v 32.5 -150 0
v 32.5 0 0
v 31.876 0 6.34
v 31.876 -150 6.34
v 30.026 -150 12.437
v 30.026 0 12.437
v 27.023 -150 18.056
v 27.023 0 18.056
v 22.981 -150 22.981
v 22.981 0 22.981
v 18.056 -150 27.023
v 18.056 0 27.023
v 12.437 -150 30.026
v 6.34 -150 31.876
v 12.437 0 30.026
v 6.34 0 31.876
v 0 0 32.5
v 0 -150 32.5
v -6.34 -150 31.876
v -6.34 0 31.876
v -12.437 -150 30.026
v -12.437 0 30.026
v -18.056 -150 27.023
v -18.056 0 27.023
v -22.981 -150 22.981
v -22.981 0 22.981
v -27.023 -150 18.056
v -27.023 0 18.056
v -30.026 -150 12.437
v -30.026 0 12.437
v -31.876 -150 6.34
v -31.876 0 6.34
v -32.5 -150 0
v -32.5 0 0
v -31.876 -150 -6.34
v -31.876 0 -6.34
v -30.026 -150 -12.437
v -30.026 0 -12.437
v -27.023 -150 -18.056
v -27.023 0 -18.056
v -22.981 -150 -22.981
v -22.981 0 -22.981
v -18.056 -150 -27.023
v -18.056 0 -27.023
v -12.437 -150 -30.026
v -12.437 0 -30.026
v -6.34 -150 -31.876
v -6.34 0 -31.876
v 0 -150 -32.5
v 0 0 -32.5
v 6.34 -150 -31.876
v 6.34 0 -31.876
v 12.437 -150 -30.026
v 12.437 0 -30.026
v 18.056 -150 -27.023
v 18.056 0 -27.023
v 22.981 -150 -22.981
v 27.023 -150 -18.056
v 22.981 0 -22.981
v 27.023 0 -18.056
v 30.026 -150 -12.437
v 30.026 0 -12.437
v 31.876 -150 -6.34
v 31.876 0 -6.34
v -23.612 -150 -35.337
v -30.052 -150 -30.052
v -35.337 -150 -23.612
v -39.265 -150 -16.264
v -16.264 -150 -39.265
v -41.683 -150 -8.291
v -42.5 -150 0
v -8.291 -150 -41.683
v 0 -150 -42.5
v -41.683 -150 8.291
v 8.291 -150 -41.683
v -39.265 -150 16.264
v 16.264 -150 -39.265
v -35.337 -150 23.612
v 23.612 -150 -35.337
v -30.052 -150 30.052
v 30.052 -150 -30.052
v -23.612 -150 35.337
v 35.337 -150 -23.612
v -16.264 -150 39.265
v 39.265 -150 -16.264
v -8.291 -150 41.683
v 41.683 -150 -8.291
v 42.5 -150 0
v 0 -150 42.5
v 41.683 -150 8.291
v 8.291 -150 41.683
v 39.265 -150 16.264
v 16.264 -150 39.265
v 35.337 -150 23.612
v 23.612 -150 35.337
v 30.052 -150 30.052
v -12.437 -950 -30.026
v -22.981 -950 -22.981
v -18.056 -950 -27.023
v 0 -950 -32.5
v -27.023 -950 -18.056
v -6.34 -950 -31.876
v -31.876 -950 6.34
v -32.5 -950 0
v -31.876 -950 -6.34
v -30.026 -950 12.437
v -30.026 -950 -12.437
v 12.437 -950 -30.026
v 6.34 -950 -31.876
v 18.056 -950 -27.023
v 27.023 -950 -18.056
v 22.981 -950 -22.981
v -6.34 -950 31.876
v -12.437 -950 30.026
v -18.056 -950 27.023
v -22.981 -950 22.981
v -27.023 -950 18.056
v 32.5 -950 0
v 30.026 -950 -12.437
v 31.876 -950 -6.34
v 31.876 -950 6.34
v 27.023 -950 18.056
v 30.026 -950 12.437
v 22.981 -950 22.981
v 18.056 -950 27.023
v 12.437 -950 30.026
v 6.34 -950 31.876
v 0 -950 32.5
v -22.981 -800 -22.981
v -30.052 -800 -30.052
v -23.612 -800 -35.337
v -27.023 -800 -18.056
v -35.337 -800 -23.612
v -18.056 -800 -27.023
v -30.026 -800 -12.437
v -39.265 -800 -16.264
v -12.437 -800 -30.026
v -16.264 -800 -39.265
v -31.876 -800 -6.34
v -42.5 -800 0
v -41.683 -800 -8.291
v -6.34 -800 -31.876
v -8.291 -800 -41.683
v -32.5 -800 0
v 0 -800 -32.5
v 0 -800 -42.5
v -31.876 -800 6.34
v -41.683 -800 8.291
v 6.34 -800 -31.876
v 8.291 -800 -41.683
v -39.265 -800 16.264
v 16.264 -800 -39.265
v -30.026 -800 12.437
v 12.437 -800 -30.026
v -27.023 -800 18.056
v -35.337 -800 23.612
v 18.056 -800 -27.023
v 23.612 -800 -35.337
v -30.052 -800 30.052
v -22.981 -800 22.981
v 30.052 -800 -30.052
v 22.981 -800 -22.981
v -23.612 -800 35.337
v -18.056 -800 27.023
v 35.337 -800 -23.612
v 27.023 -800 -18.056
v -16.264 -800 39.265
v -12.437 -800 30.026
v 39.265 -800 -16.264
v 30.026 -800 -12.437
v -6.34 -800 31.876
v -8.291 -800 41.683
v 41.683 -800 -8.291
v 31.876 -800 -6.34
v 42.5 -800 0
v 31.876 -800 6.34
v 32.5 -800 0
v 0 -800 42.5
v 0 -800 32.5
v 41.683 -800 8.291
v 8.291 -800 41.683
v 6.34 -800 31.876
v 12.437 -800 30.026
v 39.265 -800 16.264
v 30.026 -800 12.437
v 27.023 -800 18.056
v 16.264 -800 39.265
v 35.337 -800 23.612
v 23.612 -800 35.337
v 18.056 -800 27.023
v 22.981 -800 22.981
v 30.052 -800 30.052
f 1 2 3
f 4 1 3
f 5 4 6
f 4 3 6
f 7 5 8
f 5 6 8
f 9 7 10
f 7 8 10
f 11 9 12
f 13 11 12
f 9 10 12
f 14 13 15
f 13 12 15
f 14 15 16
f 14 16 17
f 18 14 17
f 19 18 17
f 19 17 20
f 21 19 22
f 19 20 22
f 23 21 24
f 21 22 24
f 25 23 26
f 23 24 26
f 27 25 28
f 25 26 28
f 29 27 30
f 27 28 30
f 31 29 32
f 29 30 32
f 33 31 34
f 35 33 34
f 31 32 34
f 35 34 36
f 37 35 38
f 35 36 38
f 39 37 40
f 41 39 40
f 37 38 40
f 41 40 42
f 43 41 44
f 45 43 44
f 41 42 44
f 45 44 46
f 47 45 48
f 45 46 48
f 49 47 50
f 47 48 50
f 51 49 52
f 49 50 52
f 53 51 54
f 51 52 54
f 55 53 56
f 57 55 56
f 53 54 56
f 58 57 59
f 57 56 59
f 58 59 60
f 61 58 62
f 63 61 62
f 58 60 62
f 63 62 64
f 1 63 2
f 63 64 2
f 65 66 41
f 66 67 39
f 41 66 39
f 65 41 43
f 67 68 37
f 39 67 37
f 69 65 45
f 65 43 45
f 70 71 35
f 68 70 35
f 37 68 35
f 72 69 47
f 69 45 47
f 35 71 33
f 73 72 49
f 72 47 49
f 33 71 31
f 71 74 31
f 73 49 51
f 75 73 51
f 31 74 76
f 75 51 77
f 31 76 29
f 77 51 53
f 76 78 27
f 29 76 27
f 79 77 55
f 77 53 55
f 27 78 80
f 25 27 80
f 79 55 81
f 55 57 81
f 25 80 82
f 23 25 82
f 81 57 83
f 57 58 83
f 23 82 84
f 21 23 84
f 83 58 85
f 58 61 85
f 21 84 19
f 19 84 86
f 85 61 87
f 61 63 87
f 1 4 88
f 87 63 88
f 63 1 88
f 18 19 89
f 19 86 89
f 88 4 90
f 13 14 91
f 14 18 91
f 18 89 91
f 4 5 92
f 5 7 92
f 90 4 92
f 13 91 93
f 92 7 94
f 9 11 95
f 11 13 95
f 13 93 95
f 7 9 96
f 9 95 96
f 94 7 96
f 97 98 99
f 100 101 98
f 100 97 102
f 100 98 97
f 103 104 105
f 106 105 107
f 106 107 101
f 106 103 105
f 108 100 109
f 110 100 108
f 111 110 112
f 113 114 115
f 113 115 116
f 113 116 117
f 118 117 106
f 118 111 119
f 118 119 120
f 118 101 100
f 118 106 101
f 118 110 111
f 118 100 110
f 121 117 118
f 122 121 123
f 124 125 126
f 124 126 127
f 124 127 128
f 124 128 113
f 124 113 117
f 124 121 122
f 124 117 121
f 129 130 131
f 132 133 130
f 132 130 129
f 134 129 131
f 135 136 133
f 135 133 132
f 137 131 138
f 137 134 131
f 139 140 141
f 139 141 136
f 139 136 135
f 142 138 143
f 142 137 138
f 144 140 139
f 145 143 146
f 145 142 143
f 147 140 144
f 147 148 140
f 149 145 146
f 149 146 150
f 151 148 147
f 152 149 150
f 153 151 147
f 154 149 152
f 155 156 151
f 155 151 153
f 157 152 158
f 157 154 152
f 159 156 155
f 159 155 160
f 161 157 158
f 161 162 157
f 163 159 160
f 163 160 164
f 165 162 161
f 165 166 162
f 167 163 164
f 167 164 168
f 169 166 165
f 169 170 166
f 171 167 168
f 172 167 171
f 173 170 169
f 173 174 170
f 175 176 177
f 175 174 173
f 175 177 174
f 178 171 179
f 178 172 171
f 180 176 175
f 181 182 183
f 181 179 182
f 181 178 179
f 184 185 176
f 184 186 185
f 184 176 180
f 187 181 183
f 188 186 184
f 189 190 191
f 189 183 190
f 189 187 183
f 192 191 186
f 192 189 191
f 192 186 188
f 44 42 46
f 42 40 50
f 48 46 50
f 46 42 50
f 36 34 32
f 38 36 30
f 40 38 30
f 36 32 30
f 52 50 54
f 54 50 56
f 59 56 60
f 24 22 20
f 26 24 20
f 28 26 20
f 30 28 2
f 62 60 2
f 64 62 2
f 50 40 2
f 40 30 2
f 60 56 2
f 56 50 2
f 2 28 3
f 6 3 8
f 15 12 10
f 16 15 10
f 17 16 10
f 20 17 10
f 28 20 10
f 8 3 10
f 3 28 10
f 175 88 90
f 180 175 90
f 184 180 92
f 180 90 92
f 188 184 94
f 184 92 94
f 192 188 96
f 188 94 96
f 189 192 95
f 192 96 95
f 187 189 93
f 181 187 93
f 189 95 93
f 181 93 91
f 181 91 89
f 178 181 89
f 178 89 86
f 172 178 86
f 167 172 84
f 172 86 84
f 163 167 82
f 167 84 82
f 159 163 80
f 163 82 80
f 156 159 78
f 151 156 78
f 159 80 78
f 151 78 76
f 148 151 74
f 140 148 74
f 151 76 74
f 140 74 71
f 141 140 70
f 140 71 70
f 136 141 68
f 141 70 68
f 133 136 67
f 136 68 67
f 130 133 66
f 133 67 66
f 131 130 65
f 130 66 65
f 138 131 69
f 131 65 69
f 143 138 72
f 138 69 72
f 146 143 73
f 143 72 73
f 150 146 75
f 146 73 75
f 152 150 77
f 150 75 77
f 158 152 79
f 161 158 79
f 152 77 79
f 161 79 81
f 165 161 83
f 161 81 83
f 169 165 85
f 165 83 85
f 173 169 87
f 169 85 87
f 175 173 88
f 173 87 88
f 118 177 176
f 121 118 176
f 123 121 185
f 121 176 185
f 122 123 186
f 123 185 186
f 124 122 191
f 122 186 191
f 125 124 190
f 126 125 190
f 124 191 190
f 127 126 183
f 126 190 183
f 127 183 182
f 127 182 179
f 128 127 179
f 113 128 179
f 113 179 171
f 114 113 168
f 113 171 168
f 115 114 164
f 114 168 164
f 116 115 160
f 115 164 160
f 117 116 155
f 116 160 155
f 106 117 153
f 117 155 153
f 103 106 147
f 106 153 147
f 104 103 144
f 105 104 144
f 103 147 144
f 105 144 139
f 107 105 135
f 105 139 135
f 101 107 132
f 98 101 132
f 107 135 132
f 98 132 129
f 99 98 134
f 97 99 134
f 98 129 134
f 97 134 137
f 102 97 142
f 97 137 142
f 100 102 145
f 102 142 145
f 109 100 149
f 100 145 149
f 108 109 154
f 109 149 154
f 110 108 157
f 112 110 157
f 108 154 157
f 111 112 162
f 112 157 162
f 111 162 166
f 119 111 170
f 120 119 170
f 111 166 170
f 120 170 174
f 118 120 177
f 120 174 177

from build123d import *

# Parameters (mm, degrees)
F0_R     = 32.5
F1_DEPTH = 150
F2_R     = 42.5
F2_R_2   = 32.5
F3_DEPTH = 650
F4_R     = 32.5
F5_DEPTH = 150


with BuildPart() as f1:
    # F0 (on Front) → F1 (new body)
    with BuildSketch(Plane.XZ):
        Circle(F0_R)
    extrude(amount=F1_DEPTH)

    # F2 (on face) → F3 (join)
    with BuildSketch(Plane.XZ.offset(150)):
        Circle(F2_R)
        Circle(F2_R_2, mode=Mode.SUBTRACT)
        Circle(F2_R_2)
    extrude(amount=F3_DEPTH)

    # F4 (on face) → F5 (join)
    with BuildSketch(Plane.XZ.offset(800)):
        Circle(F4_R)
    extrude(amount=F5_DEPTH)


solid = f1.part
